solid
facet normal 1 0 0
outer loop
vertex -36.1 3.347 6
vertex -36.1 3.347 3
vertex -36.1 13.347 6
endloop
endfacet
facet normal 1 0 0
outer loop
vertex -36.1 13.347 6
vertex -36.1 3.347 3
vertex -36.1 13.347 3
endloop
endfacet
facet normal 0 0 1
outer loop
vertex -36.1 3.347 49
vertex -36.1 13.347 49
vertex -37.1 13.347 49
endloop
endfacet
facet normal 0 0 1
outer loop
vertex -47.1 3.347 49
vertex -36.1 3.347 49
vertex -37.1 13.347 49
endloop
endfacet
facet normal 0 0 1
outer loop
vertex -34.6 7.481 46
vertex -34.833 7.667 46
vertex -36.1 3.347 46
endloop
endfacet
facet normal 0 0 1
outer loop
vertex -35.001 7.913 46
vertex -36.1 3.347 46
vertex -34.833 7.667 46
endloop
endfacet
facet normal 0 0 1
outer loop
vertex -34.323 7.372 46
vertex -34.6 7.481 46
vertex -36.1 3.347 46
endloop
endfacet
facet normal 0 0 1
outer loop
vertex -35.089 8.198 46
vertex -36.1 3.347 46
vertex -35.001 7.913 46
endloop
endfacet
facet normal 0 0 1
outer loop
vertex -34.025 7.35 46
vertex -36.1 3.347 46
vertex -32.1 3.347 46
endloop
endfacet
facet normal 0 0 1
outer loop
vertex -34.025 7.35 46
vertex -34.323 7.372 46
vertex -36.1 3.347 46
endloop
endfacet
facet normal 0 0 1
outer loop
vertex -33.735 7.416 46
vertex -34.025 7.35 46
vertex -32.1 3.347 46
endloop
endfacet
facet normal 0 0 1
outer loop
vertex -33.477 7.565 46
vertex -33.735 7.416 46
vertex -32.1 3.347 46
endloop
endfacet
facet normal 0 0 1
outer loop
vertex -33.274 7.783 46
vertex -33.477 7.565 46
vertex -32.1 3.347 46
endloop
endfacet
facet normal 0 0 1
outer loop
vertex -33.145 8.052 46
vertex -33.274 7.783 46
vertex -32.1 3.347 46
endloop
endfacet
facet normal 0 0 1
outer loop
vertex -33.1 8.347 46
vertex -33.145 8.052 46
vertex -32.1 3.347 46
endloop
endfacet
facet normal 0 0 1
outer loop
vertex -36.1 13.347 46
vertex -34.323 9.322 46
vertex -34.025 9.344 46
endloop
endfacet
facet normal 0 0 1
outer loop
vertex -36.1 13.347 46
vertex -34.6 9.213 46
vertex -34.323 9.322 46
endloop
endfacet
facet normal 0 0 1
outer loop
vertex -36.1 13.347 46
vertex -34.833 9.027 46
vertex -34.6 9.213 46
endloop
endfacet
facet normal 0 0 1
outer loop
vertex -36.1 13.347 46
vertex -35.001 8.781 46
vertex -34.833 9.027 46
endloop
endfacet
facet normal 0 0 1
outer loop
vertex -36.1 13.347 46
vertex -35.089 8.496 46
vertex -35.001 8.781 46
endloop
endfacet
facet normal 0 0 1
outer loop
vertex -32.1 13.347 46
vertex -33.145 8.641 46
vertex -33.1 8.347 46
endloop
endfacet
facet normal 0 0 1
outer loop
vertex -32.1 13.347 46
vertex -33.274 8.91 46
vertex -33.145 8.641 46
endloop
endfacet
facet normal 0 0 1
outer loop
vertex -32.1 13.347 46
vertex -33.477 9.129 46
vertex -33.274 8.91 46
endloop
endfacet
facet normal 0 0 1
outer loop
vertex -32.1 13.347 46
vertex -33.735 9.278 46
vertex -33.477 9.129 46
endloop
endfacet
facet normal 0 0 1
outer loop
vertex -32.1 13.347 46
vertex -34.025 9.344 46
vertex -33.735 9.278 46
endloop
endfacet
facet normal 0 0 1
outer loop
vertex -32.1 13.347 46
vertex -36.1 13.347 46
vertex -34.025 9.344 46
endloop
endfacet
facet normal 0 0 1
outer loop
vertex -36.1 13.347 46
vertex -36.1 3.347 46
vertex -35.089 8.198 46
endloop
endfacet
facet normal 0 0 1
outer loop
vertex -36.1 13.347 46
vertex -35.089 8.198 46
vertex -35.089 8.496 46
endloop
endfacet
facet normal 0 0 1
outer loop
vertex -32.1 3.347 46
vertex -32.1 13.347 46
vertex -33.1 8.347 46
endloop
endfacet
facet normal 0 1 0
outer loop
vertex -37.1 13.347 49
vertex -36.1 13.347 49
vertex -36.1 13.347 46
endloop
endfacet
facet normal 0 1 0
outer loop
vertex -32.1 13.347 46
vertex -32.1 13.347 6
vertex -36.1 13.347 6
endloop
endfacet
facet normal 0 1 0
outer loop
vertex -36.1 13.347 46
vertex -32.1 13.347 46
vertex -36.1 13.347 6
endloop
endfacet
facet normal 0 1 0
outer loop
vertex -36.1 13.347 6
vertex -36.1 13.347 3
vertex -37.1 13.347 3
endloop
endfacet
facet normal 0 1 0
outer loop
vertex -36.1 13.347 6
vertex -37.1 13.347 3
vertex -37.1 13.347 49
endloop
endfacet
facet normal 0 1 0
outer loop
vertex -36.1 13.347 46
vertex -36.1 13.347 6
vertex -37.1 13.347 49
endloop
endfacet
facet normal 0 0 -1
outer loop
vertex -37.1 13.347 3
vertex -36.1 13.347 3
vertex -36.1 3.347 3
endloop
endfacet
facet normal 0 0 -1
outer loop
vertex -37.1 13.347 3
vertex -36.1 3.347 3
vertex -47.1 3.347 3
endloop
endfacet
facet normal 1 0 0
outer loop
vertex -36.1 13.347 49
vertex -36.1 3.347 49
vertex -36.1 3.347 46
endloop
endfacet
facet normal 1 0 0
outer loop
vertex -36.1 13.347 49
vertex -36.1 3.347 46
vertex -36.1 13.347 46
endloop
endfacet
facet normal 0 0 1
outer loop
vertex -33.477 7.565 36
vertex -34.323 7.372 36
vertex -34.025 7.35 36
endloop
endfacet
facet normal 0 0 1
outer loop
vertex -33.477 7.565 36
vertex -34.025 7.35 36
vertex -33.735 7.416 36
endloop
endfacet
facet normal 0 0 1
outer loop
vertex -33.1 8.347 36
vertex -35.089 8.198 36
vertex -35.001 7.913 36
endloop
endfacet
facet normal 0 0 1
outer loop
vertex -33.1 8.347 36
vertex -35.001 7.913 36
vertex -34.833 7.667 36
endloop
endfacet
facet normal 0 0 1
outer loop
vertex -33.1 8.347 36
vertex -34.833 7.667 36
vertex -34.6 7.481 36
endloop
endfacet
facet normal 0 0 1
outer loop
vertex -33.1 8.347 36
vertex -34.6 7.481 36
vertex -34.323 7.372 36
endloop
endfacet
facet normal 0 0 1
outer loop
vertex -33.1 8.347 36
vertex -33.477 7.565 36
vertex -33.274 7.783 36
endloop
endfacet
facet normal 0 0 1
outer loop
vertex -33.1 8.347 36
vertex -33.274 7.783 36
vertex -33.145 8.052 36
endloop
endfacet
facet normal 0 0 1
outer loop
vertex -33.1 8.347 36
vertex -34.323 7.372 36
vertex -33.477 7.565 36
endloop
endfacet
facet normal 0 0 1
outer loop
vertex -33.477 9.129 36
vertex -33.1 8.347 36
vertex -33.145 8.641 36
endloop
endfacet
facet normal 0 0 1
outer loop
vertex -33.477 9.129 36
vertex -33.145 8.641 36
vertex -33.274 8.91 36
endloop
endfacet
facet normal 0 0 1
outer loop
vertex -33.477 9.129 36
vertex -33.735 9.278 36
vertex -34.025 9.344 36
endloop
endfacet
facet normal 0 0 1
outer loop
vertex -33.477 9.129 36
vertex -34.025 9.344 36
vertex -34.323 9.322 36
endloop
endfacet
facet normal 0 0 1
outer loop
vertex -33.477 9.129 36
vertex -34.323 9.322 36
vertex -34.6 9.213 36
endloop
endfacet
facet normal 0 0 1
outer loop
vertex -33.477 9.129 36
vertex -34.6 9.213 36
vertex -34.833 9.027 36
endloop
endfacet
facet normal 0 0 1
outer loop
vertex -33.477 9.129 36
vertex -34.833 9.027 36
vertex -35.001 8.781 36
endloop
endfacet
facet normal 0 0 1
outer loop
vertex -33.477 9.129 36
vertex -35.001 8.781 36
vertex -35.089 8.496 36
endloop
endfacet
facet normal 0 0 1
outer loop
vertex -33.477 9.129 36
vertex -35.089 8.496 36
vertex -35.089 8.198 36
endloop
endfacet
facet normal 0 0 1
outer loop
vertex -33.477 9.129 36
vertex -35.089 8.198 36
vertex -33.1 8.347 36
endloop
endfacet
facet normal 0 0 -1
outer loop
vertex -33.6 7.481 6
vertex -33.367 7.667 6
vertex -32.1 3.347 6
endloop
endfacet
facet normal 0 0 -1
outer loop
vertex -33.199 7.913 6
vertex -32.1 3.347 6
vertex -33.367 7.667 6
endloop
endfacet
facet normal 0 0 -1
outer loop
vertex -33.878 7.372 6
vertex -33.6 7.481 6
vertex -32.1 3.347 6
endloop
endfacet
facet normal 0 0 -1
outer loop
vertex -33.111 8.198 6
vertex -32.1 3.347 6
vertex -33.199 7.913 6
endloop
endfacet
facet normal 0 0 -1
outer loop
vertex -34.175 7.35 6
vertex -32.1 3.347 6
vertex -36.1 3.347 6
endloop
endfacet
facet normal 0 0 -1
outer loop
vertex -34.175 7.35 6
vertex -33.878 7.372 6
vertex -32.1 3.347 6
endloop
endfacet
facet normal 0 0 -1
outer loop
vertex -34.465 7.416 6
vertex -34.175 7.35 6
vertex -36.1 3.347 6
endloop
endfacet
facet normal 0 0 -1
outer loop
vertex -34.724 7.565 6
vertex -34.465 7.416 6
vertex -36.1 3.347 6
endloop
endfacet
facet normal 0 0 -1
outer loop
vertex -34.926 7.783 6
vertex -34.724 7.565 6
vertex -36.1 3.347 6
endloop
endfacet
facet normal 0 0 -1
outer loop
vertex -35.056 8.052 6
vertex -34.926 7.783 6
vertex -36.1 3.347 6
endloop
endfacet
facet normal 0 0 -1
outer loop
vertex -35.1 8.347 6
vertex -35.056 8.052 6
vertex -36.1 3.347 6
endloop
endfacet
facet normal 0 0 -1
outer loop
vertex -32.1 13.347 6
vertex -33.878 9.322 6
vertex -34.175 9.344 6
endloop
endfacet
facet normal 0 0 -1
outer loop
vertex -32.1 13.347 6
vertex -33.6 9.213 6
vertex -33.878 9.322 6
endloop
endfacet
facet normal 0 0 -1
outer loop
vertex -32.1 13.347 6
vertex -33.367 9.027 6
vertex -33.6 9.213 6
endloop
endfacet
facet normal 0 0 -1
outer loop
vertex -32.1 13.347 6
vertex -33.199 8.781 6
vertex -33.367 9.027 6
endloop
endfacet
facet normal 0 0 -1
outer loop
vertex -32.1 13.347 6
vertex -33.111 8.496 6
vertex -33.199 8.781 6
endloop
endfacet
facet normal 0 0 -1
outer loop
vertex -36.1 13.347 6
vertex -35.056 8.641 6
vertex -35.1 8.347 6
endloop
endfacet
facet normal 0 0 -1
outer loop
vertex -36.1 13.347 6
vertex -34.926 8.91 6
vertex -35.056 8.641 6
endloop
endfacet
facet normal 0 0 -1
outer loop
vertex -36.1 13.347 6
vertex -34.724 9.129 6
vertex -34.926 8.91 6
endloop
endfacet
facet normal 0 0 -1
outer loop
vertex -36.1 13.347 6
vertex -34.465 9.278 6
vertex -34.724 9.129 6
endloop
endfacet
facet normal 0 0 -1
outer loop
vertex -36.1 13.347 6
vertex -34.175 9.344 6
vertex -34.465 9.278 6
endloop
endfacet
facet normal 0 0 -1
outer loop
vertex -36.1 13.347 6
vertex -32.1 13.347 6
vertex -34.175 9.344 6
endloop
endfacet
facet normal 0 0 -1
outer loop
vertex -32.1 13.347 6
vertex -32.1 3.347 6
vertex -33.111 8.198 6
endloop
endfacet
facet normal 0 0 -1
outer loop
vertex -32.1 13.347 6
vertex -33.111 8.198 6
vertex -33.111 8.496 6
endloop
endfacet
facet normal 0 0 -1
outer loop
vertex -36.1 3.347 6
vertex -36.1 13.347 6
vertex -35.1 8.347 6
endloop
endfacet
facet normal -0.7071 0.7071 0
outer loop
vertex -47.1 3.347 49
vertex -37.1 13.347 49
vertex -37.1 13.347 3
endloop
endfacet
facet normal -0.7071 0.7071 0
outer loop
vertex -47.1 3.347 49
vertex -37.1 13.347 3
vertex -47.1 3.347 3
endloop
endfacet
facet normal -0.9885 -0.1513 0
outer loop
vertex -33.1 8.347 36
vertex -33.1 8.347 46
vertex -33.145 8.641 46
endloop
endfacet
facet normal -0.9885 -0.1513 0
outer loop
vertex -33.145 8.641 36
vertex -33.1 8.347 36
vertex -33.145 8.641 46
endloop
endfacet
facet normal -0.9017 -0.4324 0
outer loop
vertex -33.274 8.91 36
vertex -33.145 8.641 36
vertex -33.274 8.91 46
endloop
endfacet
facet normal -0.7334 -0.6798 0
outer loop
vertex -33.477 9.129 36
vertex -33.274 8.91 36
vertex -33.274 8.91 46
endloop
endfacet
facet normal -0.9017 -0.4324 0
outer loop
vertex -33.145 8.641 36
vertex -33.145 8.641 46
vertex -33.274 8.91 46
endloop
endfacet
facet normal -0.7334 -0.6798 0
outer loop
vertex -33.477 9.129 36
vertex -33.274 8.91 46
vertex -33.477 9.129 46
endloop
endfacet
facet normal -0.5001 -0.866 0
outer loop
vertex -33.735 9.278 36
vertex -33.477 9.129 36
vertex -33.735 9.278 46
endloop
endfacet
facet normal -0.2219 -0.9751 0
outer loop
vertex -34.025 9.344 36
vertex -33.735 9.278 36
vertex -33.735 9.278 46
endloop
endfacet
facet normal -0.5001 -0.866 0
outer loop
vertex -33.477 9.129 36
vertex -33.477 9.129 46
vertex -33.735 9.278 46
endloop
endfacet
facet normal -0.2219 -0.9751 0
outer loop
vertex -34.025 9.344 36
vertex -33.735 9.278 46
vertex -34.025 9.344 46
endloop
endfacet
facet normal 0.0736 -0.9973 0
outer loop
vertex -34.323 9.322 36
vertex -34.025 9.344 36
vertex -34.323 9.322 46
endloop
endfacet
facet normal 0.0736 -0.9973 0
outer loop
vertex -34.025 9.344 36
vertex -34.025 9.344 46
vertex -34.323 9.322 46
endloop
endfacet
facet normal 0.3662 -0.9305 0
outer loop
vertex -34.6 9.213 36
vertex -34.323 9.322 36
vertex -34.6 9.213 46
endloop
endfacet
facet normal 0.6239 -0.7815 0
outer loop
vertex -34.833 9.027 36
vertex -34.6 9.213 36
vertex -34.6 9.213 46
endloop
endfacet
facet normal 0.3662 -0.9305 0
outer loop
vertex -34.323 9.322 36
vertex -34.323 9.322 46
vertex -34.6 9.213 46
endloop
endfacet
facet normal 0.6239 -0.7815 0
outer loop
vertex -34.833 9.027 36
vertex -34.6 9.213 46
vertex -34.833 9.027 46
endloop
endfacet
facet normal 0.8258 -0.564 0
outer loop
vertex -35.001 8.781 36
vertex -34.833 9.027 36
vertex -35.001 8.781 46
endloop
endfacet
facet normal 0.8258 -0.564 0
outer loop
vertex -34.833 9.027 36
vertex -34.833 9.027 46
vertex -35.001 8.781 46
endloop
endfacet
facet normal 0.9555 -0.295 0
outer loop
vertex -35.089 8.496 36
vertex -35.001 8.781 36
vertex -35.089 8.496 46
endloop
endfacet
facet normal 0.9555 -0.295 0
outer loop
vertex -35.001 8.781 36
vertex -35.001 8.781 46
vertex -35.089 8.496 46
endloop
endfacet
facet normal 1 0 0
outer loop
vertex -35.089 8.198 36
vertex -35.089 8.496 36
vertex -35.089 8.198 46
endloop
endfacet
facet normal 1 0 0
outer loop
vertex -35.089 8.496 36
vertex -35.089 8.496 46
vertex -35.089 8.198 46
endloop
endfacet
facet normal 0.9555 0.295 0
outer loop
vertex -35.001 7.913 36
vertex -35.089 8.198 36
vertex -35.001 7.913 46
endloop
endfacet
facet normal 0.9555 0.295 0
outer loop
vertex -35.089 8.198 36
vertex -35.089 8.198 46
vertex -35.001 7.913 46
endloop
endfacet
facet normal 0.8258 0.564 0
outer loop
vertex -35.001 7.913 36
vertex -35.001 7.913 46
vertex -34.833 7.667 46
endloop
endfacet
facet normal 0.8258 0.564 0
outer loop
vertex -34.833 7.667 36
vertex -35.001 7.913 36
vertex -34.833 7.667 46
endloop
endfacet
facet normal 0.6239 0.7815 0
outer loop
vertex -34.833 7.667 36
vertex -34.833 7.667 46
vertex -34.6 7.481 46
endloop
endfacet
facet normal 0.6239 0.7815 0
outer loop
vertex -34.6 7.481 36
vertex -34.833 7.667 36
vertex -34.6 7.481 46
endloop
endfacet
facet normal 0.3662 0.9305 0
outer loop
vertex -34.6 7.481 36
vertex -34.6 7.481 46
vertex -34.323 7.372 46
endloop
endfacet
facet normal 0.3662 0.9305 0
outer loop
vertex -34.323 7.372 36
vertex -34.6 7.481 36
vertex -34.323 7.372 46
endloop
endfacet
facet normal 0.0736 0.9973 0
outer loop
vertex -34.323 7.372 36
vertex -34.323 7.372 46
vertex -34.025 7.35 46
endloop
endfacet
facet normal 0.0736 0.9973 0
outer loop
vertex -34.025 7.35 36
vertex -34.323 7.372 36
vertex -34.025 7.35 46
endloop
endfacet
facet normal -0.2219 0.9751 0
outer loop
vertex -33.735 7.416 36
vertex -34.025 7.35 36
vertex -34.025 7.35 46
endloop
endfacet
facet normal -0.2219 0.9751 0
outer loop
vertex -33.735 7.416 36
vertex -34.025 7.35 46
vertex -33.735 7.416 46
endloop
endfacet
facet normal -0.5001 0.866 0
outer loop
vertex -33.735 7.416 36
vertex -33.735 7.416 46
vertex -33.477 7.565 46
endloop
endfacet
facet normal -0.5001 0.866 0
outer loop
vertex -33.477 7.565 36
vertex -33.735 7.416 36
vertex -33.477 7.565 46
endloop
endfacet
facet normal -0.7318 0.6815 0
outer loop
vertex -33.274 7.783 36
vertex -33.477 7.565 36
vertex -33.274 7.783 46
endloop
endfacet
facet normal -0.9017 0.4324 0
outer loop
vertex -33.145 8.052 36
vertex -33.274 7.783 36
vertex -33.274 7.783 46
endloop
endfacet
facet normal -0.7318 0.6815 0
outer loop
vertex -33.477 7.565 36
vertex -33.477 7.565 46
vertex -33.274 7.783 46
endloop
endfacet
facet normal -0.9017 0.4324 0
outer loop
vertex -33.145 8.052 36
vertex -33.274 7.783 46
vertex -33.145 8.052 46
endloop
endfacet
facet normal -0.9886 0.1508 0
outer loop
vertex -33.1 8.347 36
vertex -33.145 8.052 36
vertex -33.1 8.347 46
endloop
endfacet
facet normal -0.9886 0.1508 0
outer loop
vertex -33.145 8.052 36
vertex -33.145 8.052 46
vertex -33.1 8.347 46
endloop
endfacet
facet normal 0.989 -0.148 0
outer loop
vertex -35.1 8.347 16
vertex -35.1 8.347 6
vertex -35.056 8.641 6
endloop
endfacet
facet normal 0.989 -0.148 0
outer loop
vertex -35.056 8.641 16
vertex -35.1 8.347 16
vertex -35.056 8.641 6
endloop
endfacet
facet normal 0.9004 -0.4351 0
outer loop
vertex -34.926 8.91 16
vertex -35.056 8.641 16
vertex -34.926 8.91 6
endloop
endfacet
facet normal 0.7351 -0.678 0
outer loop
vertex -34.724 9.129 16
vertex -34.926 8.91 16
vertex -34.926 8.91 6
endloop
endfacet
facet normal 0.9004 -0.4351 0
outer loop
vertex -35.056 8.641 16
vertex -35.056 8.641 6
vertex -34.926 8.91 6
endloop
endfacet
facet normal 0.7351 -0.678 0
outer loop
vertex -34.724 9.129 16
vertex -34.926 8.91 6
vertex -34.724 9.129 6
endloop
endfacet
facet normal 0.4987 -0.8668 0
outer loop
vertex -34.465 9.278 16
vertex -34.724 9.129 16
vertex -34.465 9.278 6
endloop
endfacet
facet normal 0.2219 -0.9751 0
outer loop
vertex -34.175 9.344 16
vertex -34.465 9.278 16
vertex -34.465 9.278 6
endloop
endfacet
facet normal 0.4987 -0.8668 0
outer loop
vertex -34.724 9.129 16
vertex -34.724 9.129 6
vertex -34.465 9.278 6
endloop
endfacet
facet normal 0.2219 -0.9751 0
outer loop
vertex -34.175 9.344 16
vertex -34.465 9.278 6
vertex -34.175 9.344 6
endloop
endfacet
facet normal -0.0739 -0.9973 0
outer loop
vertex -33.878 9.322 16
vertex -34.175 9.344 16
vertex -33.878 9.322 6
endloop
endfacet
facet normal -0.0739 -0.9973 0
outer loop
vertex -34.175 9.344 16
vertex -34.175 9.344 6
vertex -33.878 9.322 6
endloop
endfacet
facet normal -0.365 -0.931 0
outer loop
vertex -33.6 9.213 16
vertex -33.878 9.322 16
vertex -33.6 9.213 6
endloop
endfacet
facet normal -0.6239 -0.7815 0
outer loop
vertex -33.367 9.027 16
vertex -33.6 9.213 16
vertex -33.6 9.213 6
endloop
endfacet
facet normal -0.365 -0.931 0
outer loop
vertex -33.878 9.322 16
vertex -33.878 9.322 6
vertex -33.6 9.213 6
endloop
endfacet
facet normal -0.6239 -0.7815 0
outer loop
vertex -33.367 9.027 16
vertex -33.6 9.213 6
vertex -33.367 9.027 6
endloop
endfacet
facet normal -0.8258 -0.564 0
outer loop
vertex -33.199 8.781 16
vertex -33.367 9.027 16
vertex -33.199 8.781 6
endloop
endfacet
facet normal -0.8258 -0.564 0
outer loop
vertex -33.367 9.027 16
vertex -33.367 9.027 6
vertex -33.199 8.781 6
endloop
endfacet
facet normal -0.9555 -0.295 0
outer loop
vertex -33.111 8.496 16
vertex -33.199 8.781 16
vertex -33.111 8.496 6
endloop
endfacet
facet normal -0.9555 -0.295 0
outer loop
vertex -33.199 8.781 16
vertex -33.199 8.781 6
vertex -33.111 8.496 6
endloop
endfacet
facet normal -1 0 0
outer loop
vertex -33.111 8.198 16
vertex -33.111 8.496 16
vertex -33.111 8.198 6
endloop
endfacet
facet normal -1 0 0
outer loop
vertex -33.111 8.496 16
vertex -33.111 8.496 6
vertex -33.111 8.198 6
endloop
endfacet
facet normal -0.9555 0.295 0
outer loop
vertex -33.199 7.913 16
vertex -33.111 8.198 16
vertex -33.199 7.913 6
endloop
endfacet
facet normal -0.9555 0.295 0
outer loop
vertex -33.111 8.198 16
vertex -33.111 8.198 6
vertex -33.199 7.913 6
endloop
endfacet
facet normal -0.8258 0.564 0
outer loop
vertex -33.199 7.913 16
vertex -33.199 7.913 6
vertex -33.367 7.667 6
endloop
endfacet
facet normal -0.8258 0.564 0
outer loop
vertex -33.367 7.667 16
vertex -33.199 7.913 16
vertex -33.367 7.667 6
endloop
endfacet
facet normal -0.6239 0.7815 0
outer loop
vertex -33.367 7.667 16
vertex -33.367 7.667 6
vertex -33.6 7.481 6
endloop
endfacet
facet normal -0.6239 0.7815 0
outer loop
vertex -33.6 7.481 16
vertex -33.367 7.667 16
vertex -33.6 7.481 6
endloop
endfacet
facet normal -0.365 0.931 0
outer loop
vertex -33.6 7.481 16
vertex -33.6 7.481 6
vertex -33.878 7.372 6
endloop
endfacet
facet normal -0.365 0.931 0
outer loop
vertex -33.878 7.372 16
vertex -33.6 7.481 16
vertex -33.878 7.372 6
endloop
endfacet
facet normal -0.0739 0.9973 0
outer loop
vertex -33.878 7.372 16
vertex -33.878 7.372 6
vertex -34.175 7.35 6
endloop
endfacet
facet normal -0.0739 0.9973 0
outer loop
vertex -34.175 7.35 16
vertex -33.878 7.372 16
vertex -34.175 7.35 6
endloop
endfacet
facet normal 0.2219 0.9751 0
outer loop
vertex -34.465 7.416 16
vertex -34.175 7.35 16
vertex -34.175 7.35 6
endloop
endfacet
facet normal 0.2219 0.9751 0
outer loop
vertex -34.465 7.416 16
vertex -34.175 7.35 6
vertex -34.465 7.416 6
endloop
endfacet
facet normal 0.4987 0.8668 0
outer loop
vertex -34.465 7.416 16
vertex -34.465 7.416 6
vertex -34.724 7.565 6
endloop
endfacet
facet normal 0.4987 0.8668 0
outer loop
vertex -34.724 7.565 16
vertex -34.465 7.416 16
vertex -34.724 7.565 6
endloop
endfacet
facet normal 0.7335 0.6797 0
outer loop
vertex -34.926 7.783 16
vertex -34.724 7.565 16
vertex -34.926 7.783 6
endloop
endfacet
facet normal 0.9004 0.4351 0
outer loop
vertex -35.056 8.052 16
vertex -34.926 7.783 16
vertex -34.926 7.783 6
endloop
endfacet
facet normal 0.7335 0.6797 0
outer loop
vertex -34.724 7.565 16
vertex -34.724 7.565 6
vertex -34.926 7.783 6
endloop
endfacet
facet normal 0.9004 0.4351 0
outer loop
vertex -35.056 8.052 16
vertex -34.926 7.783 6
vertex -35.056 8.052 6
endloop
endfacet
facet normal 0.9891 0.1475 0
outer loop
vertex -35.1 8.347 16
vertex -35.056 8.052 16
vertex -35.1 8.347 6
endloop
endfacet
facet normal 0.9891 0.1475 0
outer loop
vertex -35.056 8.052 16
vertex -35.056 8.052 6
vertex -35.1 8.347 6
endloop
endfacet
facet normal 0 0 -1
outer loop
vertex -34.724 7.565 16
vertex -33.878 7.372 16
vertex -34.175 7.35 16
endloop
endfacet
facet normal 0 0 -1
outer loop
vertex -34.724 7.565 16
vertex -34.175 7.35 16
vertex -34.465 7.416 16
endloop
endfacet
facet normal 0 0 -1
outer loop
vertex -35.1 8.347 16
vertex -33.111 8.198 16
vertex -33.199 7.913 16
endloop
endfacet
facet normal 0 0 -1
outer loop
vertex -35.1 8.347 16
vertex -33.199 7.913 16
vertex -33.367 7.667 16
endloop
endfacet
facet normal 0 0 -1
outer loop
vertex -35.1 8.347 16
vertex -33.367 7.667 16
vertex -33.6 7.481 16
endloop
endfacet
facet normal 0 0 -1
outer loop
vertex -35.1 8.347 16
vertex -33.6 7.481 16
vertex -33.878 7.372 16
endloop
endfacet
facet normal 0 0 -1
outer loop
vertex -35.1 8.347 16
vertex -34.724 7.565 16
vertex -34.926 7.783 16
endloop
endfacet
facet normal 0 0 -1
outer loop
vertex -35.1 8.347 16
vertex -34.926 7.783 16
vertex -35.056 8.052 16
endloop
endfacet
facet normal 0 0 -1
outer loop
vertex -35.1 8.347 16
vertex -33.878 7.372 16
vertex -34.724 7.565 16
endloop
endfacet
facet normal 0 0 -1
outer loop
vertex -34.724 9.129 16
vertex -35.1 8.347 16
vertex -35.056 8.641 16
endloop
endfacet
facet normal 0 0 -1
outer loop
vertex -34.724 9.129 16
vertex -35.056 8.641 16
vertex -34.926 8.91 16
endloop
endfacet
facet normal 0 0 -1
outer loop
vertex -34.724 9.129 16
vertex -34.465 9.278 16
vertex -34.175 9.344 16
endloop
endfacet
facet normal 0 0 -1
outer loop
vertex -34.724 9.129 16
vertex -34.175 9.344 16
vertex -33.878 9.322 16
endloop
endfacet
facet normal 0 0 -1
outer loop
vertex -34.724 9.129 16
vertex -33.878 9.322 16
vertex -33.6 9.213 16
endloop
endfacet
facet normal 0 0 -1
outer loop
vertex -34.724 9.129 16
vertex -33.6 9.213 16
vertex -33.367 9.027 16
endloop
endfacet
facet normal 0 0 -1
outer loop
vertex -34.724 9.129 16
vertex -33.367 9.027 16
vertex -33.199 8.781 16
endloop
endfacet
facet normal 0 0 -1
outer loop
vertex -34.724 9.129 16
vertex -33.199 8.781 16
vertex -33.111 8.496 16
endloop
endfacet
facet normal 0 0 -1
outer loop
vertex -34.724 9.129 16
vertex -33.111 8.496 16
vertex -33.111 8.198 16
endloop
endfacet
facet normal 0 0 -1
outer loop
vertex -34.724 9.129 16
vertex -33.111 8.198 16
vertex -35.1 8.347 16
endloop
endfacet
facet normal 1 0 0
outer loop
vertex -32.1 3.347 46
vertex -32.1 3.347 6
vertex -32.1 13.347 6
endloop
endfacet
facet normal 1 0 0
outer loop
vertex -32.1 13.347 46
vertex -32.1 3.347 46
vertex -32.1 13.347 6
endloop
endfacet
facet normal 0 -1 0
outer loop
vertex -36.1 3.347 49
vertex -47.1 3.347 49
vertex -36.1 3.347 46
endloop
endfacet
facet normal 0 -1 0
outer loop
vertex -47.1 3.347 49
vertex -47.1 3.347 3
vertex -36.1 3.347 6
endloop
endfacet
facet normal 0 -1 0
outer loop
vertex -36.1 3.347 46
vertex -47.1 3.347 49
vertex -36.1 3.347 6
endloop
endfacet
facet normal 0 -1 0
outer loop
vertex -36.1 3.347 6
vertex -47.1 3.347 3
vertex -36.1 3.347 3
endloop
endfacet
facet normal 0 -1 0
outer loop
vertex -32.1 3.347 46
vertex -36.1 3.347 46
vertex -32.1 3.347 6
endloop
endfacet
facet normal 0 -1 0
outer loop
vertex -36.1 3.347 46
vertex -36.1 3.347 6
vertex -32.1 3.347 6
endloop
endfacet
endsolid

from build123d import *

# Parameters (mm, degrees)
BOSS_EXTRUDE1_DEPTH = 52
SKETCH4_W           = 4
SKETCH4_H           = 10
CUT_EXTRUDE1_DEPTH  = 6
SKETCH5_W           = 4
SKETCH5_H           = 10
CUT_EXTRUDE2_DEPTH  = 6
CUT_EXTRUDE3_DEPTH  = 3
CUT_EXTRUDE4_DEPTH  = 3
SKETCH8_R           = 1
CUT_EXTRUDE5_DEPTH  = 10
SKETCH9_R           = 1
CUT_EXTRUDE6_DEPTH  = 10


with BuildPart() as part:
    # Sketch1 → Boss-Extrude1 (new body)
    with BuildSketch(Plane.XY):
        Polygon((-37.100108605, 13.346711561), (-47.100108605, 3.346711561), (-32.100108605, 3.346711561), (-32.100108605, 13.346711561), align=None)
    extrude(amount=BOSS_EXTRUDE1_DEPTH)

    # Sketch4 → Cut-Extrude1 (cut)
    with BuildSketch(Plane.XY.offset(52)):
        with Locations((-34.100108605, 8.346711561)):
            Rectangle(SKETCH4_W, SKETCH4_H)
    extrude(amount=-CUT_EXTRUDE1_DEPTH, mode=Mode.SUBTRACT)

    # Sketch5 → Cut-Extrude2 (cut)
    with BuildSketch(Plane(origin=(0, 0, 0), x_dir=(-1, 0, 0), z_dir=(0, 0, -1))):
        with Locations((34.100108605, 8.346711561)):
            Rectangle(SKETCH5_W, SKETCH5_H)
    extrude(amount=-CUT_EXTRUDE2_DEPTH, mode=Mode.SUBTRACT)

    # Sketch6 → Cut-Extrude3 (cut)
    with BuildSketch(Plane.XY.offset(52)):
        Polygon((-47.100108605, 3.346711561), (-37.100108605, 13.346711561), (-36.100108605, 13.346711561), (-36.100108605, 3.346711561), align=None)
    extrude(amount=-CUT_EXTRUDE3_DEPTH, mode=Mode.SUBTRACT)

    # Sketch7 → Cut-Extrude4 (cut)
    with BuildSketch(Plane(origin=(0, 0, 0), x_dir=(-1, 0, 0), z_dir=(0, 0, -1))):
        Polygon((47.100108605, 3.346711561), (37.100108605, 13.346711561), (36.100108605, 13.346711561), (36.100108605, 3.346711561), align=None)
    extrude(amount=-CUT_EXTRUDE4_DEPTH, mode=Mode.SUBTRACT)

    # Sketch8 → Cut-Extrude5 (cut)
    with BuildSketch(Plane(origin=(0, 0, 6), x_dir=(-1, 0, 0), z_dir=(0, 0, -1))):
        with Locations((34.100108605, 8.346711561)):
            Circle(SKETCH8_R)
    extrude(amount=-CUT_EXTRUDE5_DEPTH, mode=Mode.SUBTRACT)

    # Sketch9 → Cut-Extrude6 (cut)
    with BuildSketch(Plane.XY.offset(46)):
        with Locations((-34.100108605, 8.346711561)):
            Circle(SKETCH9_R)
    extrude(amount=-CUT_EXTRUDE6_DEPTH, mode=Mode.SUBTRACT)


solid = part.part
